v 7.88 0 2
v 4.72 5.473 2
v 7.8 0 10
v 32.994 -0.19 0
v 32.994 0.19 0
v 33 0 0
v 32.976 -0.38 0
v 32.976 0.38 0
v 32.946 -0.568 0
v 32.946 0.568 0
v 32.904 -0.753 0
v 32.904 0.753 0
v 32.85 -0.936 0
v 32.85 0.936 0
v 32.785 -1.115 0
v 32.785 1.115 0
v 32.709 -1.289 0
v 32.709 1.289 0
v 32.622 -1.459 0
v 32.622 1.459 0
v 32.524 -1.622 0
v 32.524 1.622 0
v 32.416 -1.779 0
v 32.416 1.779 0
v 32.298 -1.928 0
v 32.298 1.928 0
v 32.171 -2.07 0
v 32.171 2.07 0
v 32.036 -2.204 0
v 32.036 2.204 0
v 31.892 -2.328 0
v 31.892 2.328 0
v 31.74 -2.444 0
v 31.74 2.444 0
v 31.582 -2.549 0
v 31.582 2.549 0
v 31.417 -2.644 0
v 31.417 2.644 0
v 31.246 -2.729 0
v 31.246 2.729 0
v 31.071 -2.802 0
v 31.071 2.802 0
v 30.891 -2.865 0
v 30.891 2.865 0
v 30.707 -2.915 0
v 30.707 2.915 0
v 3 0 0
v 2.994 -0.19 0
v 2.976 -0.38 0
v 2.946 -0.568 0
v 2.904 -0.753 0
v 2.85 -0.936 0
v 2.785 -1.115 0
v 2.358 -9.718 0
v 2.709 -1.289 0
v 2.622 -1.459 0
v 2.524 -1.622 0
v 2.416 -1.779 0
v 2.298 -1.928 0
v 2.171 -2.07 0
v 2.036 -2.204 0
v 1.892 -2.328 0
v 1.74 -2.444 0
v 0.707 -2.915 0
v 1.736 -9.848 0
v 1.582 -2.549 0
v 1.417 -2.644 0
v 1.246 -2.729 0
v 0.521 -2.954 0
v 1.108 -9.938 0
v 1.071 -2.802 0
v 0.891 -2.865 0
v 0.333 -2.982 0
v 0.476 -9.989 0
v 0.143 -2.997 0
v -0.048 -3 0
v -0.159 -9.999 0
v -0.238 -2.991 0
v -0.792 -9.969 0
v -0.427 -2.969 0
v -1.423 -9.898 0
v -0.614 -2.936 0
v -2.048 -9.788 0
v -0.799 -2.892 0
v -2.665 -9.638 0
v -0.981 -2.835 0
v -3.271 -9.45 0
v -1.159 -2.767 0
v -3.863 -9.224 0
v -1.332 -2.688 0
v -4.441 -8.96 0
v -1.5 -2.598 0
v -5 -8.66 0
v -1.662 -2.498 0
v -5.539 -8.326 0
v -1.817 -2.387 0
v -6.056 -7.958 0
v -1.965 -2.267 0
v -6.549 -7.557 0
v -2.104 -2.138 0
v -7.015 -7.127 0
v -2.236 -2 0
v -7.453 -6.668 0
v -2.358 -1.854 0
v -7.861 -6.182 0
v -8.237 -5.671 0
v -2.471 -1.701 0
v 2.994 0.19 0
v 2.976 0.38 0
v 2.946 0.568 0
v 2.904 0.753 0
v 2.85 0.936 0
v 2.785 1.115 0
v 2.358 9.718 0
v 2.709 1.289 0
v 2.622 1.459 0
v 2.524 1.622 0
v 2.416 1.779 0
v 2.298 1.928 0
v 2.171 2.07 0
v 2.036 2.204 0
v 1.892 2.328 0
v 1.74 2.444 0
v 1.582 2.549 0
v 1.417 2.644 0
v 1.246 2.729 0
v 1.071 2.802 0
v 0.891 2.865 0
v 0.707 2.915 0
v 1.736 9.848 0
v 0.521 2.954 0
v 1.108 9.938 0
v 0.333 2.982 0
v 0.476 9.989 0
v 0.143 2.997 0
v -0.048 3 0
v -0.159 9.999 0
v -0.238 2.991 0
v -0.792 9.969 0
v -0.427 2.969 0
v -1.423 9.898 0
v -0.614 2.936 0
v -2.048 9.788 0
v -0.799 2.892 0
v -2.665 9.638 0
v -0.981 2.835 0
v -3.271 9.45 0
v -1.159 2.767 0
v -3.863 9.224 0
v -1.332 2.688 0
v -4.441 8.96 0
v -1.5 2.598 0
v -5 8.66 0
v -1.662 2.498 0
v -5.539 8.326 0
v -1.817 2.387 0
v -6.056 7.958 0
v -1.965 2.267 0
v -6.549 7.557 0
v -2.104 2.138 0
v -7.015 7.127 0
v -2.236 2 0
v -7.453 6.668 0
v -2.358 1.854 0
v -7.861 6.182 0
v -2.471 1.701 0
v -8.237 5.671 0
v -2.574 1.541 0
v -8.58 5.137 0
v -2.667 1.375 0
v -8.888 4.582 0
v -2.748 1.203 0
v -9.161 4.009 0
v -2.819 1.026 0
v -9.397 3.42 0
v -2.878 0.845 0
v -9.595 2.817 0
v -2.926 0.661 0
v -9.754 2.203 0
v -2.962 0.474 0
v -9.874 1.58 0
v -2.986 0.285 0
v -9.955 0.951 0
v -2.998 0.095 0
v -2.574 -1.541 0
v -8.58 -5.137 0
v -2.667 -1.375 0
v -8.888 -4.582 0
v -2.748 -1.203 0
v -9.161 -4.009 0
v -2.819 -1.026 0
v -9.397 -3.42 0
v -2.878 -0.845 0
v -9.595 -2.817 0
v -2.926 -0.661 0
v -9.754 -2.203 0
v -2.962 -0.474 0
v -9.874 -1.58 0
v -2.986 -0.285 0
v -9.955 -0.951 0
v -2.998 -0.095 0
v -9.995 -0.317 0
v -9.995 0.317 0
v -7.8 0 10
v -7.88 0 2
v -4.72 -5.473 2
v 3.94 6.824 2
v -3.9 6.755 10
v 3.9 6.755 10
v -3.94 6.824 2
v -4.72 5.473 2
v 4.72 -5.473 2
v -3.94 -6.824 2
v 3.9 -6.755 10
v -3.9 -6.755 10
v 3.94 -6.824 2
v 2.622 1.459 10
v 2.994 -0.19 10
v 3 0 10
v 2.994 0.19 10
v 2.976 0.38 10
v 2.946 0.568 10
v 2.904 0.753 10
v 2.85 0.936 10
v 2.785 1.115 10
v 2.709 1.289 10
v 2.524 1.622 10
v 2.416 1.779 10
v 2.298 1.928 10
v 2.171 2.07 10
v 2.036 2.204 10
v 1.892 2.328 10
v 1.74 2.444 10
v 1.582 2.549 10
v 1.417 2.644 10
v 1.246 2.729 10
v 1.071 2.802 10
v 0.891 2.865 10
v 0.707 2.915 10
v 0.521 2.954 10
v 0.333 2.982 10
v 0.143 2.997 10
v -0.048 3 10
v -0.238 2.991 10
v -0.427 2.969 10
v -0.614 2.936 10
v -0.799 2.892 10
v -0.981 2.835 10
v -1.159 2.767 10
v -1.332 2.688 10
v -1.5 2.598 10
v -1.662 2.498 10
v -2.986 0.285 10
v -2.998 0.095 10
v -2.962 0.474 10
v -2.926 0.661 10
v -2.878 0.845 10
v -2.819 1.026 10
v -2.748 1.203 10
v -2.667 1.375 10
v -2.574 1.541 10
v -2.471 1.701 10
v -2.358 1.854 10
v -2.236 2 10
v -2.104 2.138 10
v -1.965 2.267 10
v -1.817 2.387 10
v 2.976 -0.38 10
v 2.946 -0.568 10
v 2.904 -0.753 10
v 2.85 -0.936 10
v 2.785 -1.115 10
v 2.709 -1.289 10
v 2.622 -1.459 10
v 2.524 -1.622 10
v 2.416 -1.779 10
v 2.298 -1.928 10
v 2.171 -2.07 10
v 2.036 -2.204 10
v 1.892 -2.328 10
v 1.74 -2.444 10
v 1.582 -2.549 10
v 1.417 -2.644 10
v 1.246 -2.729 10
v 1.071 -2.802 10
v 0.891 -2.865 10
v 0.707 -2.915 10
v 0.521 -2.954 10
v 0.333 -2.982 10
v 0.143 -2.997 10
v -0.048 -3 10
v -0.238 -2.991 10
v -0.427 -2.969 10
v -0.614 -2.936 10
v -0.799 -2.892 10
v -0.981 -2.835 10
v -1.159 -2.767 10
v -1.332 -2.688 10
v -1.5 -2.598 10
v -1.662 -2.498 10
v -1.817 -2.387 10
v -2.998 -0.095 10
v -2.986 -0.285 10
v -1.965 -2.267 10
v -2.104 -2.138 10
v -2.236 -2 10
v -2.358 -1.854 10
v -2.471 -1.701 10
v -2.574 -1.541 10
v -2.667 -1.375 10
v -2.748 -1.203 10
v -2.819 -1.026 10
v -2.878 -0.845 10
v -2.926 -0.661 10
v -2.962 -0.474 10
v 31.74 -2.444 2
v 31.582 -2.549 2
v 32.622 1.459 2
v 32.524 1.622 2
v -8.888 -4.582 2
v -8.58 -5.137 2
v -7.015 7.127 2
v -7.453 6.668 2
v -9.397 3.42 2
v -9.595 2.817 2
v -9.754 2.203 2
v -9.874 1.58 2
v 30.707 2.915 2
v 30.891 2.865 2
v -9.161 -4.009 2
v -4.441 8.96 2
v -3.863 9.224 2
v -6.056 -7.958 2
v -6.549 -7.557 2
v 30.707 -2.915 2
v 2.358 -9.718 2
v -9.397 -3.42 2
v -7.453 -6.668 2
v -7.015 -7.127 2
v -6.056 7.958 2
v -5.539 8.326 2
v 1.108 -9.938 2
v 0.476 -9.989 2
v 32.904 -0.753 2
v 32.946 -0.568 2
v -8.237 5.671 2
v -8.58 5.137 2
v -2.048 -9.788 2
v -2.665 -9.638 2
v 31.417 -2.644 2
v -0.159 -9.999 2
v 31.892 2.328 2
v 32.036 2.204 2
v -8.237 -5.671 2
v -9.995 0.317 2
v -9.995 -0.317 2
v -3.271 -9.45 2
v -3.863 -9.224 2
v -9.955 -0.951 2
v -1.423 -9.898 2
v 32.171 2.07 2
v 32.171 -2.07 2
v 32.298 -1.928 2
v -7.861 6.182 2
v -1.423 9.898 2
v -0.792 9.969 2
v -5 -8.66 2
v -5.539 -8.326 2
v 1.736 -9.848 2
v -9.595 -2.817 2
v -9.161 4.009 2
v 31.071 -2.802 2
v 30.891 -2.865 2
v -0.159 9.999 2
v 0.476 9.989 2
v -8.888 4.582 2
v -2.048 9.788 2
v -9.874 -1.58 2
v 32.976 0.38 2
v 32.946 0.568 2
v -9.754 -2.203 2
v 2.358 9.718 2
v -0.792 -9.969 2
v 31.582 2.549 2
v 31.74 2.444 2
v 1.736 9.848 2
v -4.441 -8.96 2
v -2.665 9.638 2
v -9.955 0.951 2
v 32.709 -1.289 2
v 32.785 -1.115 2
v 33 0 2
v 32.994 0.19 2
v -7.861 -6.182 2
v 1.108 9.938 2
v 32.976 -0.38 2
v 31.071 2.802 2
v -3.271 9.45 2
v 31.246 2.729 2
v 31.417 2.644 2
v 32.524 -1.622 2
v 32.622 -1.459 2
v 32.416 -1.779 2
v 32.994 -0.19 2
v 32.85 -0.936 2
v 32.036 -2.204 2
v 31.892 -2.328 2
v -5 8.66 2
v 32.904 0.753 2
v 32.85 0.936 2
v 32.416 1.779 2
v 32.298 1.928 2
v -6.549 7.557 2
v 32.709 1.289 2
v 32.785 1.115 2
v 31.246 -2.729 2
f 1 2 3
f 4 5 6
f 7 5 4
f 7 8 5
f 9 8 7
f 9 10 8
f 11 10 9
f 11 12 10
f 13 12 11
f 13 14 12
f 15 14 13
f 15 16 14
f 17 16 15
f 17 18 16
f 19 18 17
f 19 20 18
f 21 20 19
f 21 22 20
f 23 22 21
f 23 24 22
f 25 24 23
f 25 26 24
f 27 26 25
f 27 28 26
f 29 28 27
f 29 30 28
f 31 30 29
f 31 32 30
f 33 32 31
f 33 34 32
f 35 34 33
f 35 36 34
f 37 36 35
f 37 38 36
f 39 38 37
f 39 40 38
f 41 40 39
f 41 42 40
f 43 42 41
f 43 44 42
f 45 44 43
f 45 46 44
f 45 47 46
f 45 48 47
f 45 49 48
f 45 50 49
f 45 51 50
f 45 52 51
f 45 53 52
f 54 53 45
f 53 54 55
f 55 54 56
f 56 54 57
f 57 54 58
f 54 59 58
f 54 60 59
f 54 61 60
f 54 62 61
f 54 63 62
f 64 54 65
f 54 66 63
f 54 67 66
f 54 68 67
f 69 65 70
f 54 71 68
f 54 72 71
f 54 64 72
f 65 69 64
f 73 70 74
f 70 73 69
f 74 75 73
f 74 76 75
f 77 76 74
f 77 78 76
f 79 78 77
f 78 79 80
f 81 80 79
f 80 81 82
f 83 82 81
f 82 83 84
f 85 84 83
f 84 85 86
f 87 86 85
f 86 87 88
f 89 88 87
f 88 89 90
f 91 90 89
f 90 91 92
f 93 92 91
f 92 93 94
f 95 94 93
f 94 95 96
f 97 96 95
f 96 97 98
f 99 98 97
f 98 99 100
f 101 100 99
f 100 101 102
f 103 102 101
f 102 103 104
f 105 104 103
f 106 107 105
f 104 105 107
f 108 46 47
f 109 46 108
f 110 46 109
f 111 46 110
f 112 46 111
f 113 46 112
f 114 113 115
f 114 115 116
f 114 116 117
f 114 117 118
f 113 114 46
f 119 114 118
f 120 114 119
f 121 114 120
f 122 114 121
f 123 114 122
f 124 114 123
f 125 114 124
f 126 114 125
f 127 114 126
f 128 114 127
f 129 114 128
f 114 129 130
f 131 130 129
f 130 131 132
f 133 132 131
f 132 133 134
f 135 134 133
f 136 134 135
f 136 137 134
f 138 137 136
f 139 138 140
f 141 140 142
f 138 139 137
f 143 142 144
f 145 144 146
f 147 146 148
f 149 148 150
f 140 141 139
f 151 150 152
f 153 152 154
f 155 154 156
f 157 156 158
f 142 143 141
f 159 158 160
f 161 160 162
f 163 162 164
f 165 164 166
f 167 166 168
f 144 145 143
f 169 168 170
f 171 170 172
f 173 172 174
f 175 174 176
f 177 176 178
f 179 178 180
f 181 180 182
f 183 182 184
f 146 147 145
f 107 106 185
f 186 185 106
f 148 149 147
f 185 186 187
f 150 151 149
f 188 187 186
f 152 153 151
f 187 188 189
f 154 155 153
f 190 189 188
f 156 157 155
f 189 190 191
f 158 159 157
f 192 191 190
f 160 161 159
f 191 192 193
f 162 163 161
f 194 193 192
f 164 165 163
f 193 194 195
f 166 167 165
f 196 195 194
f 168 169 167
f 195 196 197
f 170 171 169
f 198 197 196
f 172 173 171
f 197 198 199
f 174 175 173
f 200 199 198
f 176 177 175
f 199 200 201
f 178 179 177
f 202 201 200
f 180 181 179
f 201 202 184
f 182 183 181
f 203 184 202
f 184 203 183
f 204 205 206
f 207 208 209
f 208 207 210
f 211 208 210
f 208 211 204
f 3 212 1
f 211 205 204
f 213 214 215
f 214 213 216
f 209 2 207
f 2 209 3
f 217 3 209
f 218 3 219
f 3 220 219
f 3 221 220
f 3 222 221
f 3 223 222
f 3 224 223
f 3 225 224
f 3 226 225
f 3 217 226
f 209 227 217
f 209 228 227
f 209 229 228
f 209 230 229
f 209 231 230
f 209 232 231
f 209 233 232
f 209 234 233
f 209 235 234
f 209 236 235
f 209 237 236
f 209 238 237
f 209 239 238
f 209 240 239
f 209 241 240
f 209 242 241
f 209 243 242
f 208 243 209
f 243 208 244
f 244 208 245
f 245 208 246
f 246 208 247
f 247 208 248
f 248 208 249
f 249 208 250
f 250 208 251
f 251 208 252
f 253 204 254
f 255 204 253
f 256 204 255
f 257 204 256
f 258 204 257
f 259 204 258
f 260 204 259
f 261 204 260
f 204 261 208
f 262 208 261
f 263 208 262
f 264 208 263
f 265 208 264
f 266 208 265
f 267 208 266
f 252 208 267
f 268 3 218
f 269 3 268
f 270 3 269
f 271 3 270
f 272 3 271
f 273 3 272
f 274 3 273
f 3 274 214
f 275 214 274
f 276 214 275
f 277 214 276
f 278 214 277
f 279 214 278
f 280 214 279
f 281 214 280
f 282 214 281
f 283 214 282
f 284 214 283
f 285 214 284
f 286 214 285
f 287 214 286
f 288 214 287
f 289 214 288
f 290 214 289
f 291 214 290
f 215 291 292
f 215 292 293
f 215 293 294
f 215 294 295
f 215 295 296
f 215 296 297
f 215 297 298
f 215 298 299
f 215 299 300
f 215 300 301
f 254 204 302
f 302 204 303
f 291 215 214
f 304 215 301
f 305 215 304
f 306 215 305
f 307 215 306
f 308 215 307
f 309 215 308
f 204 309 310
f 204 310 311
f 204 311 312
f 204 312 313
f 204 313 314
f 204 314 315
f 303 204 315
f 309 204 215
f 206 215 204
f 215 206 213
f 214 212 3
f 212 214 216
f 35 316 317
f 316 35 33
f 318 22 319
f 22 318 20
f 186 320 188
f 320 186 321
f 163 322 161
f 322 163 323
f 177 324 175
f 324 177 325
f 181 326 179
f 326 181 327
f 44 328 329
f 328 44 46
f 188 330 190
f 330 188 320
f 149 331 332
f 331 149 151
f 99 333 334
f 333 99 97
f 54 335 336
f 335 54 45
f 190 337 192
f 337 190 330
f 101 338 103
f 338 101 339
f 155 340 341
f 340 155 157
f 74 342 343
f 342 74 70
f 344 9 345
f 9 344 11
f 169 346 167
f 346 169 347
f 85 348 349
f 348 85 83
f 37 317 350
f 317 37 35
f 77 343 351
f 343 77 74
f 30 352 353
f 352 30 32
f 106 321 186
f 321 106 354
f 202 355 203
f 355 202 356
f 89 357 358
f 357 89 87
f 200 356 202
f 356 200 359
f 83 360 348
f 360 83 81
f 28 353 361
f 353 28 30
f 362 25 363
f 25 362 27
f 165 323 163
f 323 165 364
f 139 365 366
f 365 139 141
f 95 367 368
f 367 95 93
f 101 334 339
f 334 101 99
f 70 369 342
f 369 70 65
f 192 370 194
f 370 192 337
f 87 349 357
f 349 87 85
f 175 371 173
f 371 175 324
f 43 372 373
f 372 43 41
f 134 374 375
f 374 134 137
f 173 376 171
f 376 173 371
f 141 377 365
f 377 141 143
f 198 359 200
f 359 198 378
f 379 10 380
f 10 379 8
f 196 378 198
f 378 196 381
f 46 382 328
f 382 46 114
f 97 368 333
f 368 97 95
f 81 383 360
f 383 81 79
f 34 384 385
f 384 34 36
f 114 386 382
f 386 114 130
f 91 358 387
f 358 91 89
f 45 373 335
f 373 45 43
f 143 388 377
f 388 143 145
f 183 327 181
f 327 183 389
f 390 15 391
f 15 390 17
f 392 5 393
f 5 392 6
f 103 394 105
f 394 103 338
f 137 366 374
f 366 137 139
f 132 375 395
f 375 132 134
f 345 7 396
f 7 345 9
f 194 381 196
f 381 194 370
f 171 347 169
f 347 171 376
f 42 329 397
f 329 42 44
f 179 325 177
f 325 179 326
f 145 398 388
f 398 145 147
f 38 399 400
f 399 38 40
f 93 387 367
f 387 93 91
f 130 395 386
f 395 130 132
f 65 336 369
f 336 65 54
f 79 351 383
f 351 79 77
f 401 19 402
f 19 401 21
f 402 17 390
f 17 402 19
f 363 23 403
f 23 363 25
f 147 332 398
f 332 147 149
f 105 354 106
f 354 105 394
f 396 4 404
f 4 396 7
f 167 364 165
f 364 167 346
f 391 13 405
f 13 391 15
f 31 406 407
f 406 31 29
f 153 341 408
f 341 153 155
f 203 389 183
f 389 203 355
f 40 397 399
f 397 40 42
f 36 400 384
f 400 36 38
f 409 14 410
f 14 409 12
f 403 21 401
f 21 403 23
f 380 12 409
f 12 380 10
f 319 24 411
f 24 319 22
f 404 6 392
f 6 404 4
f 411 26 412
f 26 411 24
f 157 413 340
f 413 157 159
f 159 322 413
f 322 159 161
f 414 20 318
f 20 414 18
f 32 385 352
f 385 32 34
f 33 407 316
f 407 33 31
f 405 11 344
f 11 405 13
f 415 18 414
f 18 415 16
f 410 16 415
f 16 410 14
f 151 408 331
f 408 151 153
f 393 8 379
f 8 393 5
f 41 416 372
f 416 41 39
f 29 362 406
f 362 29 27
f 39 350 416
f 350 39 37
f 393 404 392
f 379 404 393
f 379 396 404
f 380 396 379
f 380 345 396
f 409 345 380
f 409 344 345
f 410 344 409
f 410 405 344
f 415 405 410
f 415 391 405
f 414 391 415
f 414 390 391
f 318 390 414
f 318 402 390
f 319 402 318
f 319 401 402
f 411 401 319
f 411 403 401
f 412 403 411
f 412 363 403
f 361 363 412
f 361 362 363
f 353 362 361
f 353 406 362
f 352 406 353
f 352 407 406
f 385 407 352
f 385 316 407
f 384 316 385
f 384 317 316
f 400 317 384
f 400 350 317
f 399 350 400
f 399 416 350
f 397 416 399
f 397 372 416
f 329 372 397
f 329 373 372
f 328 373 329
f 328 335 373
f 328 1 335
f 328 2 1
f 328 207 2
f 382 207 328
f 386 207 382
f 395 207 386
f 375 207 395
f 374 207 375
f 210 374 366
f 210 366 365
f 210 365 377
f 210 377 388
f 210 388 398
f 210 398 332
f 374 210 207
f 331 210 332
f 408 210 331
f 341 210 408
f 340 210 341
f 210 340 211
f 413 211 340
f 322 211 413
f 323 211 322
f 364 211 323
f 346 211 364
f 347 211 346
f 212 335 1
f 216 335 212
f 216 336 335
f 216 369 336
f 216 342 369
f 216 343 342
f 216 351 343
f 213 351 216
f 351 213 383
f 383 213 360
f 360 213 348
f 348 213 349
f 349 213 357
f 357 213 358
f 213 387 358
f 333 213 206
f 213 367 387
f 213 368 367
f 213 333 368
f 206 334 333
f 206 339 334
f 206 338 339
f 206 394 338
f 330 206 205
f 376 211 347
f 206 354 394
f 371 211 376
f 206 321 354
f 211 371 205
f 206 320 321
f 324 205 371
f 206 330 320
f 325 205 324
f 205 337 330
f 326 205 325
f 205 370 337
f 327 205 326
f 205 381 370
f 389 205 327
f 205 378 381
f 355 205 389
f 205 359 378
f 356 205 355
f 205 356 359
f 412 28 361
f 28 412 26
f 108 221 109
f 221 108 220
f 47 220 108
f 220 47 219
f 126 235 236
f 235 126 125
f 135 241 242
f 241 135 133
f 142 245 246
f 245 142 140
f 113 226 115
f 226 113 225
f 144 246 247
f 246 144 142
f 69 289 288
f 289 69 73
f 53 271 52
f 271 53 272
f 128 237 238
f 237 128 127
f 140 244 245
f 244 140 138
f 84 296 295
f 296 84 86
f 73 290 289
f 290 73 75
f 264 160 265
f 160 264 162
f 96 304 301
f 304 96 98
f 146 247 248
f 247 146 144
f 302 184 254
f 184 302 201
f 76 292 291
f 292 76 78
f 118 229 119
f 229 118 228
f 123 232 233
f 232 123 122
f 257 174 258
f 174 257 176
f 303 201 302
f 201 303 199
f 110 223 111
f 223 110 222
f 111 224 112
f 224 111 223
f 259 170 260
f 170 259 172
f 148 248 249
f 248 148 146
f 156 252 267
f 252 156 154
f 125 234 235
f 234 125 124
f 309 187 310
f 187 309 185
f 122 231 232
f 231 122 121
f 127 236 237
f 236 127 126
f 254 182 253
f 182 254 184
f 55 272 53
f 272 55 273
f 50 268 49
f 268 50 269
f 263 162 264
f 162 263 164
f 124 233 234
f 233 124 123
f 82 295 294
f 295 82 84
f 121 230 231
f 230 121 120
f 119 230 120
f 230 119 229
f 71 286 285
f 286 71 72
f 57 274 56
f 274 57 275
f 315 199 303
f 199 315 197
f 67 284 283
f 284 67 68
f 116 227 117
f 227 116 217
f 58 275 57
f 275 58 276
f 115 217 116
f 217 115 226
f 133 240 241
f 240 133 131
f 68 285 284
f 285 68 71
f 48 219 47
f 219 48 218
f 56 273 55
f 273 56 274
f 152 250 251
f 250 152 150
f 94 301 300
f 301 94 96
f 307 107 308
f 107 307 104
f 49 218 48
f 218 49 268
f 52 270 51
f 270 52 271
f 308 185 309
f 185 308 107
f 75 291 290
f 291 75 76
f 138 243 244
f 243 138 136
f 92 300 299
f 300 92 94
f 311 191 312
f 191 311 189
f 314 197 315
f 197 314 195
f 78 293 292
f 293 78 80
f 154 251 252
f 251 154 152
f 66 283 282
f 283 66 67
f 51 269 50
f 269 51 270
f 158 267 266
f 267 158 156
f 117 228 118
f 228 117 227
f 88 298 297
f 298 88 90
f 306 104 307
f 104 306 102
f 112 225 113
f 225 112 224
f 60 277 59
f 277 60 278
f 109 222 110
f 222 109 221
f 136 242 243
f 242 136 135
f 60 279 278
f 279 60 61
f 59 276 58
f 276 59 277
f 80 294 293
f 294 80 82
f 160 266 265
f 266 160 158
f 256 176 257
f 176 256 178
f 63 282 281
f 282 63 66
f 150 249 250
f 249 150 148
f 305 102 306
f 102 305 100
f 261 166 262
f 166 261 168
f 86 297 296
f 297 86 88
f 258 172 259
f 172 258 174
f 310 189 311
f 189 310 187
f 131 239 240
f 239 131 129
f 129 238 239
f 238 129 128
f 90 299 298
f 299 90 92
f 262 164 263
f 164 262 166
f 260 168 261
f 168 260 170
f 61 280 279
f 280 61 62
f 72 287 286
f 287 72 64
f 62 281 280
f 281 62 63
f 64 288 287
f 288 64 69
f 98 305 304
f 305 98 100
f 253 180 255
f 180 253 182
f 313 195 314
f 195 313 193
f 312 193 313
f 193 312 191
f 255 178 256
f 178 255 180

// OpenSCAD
//=================================================================================
// HeaterKnob.scad
//
// Extend the thermostat and make it visible.
//
// DrTomFlint, 11 Oct 2025
//=================================================================================


F2=99;

//----------------------------------------------------------------------------------
module knob(tol=0){
	difference(){
    union(){
      cylinder(r=33/2+2,h=11,$fn=F2);
      translate([0,0,11])
      cylinder(r1=33/2+2,r2=10-2,h=6+2);
      translate([0,0,11+6])
      cylinder(r=10,h=40,$fn=6);
    }
    
    // knob
    cylinder(r1=32/2,r2=33/2,h=9.5,$fn=F2);
    cylinder(r1=34/2,r2=32/2,h=1,$fn=F2);
    
    // shaft cut
    cylinder(r=8,h=64,$fn=6);
    
    cube([1,50,18],center=true);
    cube([50,1,18],center=true);
    
	}
  
}
  
//----------------------------------------------------------------------------------
module lock(){
    translate([0,0,9.5])
    cylinder(r=8-0.25,h=10,$fn=6);
    translate([0,0,5])
    linear_extrude(scale=1.3,height=10)
    offset(r=1,$fn=22)
    square([4,4],center=true);
}
  
//----------------------------------------------------------------------------------
module dial(){
  
  difference(){
    union(){
      cylinder(r1=8-0.1,r2=8-0.2,h=10,$fn=6);
      hull(){
        cylinder(r=10,h=2,$fn=F2);
        translate([30,0,0])
        cylinder(r=3,h=2,$fn=F2);
      }
    }
    cylinder(r=3,h=20,$fn=F2);
  }
}
  
//=================================================================================

//~ difference(){
//~ union(){
//~ knob();

//~ lock();

//~ }
//~ cube([100,100,100]);
//~ }



//~ lock();
//~ knob();
dial();

//=================================================================================
